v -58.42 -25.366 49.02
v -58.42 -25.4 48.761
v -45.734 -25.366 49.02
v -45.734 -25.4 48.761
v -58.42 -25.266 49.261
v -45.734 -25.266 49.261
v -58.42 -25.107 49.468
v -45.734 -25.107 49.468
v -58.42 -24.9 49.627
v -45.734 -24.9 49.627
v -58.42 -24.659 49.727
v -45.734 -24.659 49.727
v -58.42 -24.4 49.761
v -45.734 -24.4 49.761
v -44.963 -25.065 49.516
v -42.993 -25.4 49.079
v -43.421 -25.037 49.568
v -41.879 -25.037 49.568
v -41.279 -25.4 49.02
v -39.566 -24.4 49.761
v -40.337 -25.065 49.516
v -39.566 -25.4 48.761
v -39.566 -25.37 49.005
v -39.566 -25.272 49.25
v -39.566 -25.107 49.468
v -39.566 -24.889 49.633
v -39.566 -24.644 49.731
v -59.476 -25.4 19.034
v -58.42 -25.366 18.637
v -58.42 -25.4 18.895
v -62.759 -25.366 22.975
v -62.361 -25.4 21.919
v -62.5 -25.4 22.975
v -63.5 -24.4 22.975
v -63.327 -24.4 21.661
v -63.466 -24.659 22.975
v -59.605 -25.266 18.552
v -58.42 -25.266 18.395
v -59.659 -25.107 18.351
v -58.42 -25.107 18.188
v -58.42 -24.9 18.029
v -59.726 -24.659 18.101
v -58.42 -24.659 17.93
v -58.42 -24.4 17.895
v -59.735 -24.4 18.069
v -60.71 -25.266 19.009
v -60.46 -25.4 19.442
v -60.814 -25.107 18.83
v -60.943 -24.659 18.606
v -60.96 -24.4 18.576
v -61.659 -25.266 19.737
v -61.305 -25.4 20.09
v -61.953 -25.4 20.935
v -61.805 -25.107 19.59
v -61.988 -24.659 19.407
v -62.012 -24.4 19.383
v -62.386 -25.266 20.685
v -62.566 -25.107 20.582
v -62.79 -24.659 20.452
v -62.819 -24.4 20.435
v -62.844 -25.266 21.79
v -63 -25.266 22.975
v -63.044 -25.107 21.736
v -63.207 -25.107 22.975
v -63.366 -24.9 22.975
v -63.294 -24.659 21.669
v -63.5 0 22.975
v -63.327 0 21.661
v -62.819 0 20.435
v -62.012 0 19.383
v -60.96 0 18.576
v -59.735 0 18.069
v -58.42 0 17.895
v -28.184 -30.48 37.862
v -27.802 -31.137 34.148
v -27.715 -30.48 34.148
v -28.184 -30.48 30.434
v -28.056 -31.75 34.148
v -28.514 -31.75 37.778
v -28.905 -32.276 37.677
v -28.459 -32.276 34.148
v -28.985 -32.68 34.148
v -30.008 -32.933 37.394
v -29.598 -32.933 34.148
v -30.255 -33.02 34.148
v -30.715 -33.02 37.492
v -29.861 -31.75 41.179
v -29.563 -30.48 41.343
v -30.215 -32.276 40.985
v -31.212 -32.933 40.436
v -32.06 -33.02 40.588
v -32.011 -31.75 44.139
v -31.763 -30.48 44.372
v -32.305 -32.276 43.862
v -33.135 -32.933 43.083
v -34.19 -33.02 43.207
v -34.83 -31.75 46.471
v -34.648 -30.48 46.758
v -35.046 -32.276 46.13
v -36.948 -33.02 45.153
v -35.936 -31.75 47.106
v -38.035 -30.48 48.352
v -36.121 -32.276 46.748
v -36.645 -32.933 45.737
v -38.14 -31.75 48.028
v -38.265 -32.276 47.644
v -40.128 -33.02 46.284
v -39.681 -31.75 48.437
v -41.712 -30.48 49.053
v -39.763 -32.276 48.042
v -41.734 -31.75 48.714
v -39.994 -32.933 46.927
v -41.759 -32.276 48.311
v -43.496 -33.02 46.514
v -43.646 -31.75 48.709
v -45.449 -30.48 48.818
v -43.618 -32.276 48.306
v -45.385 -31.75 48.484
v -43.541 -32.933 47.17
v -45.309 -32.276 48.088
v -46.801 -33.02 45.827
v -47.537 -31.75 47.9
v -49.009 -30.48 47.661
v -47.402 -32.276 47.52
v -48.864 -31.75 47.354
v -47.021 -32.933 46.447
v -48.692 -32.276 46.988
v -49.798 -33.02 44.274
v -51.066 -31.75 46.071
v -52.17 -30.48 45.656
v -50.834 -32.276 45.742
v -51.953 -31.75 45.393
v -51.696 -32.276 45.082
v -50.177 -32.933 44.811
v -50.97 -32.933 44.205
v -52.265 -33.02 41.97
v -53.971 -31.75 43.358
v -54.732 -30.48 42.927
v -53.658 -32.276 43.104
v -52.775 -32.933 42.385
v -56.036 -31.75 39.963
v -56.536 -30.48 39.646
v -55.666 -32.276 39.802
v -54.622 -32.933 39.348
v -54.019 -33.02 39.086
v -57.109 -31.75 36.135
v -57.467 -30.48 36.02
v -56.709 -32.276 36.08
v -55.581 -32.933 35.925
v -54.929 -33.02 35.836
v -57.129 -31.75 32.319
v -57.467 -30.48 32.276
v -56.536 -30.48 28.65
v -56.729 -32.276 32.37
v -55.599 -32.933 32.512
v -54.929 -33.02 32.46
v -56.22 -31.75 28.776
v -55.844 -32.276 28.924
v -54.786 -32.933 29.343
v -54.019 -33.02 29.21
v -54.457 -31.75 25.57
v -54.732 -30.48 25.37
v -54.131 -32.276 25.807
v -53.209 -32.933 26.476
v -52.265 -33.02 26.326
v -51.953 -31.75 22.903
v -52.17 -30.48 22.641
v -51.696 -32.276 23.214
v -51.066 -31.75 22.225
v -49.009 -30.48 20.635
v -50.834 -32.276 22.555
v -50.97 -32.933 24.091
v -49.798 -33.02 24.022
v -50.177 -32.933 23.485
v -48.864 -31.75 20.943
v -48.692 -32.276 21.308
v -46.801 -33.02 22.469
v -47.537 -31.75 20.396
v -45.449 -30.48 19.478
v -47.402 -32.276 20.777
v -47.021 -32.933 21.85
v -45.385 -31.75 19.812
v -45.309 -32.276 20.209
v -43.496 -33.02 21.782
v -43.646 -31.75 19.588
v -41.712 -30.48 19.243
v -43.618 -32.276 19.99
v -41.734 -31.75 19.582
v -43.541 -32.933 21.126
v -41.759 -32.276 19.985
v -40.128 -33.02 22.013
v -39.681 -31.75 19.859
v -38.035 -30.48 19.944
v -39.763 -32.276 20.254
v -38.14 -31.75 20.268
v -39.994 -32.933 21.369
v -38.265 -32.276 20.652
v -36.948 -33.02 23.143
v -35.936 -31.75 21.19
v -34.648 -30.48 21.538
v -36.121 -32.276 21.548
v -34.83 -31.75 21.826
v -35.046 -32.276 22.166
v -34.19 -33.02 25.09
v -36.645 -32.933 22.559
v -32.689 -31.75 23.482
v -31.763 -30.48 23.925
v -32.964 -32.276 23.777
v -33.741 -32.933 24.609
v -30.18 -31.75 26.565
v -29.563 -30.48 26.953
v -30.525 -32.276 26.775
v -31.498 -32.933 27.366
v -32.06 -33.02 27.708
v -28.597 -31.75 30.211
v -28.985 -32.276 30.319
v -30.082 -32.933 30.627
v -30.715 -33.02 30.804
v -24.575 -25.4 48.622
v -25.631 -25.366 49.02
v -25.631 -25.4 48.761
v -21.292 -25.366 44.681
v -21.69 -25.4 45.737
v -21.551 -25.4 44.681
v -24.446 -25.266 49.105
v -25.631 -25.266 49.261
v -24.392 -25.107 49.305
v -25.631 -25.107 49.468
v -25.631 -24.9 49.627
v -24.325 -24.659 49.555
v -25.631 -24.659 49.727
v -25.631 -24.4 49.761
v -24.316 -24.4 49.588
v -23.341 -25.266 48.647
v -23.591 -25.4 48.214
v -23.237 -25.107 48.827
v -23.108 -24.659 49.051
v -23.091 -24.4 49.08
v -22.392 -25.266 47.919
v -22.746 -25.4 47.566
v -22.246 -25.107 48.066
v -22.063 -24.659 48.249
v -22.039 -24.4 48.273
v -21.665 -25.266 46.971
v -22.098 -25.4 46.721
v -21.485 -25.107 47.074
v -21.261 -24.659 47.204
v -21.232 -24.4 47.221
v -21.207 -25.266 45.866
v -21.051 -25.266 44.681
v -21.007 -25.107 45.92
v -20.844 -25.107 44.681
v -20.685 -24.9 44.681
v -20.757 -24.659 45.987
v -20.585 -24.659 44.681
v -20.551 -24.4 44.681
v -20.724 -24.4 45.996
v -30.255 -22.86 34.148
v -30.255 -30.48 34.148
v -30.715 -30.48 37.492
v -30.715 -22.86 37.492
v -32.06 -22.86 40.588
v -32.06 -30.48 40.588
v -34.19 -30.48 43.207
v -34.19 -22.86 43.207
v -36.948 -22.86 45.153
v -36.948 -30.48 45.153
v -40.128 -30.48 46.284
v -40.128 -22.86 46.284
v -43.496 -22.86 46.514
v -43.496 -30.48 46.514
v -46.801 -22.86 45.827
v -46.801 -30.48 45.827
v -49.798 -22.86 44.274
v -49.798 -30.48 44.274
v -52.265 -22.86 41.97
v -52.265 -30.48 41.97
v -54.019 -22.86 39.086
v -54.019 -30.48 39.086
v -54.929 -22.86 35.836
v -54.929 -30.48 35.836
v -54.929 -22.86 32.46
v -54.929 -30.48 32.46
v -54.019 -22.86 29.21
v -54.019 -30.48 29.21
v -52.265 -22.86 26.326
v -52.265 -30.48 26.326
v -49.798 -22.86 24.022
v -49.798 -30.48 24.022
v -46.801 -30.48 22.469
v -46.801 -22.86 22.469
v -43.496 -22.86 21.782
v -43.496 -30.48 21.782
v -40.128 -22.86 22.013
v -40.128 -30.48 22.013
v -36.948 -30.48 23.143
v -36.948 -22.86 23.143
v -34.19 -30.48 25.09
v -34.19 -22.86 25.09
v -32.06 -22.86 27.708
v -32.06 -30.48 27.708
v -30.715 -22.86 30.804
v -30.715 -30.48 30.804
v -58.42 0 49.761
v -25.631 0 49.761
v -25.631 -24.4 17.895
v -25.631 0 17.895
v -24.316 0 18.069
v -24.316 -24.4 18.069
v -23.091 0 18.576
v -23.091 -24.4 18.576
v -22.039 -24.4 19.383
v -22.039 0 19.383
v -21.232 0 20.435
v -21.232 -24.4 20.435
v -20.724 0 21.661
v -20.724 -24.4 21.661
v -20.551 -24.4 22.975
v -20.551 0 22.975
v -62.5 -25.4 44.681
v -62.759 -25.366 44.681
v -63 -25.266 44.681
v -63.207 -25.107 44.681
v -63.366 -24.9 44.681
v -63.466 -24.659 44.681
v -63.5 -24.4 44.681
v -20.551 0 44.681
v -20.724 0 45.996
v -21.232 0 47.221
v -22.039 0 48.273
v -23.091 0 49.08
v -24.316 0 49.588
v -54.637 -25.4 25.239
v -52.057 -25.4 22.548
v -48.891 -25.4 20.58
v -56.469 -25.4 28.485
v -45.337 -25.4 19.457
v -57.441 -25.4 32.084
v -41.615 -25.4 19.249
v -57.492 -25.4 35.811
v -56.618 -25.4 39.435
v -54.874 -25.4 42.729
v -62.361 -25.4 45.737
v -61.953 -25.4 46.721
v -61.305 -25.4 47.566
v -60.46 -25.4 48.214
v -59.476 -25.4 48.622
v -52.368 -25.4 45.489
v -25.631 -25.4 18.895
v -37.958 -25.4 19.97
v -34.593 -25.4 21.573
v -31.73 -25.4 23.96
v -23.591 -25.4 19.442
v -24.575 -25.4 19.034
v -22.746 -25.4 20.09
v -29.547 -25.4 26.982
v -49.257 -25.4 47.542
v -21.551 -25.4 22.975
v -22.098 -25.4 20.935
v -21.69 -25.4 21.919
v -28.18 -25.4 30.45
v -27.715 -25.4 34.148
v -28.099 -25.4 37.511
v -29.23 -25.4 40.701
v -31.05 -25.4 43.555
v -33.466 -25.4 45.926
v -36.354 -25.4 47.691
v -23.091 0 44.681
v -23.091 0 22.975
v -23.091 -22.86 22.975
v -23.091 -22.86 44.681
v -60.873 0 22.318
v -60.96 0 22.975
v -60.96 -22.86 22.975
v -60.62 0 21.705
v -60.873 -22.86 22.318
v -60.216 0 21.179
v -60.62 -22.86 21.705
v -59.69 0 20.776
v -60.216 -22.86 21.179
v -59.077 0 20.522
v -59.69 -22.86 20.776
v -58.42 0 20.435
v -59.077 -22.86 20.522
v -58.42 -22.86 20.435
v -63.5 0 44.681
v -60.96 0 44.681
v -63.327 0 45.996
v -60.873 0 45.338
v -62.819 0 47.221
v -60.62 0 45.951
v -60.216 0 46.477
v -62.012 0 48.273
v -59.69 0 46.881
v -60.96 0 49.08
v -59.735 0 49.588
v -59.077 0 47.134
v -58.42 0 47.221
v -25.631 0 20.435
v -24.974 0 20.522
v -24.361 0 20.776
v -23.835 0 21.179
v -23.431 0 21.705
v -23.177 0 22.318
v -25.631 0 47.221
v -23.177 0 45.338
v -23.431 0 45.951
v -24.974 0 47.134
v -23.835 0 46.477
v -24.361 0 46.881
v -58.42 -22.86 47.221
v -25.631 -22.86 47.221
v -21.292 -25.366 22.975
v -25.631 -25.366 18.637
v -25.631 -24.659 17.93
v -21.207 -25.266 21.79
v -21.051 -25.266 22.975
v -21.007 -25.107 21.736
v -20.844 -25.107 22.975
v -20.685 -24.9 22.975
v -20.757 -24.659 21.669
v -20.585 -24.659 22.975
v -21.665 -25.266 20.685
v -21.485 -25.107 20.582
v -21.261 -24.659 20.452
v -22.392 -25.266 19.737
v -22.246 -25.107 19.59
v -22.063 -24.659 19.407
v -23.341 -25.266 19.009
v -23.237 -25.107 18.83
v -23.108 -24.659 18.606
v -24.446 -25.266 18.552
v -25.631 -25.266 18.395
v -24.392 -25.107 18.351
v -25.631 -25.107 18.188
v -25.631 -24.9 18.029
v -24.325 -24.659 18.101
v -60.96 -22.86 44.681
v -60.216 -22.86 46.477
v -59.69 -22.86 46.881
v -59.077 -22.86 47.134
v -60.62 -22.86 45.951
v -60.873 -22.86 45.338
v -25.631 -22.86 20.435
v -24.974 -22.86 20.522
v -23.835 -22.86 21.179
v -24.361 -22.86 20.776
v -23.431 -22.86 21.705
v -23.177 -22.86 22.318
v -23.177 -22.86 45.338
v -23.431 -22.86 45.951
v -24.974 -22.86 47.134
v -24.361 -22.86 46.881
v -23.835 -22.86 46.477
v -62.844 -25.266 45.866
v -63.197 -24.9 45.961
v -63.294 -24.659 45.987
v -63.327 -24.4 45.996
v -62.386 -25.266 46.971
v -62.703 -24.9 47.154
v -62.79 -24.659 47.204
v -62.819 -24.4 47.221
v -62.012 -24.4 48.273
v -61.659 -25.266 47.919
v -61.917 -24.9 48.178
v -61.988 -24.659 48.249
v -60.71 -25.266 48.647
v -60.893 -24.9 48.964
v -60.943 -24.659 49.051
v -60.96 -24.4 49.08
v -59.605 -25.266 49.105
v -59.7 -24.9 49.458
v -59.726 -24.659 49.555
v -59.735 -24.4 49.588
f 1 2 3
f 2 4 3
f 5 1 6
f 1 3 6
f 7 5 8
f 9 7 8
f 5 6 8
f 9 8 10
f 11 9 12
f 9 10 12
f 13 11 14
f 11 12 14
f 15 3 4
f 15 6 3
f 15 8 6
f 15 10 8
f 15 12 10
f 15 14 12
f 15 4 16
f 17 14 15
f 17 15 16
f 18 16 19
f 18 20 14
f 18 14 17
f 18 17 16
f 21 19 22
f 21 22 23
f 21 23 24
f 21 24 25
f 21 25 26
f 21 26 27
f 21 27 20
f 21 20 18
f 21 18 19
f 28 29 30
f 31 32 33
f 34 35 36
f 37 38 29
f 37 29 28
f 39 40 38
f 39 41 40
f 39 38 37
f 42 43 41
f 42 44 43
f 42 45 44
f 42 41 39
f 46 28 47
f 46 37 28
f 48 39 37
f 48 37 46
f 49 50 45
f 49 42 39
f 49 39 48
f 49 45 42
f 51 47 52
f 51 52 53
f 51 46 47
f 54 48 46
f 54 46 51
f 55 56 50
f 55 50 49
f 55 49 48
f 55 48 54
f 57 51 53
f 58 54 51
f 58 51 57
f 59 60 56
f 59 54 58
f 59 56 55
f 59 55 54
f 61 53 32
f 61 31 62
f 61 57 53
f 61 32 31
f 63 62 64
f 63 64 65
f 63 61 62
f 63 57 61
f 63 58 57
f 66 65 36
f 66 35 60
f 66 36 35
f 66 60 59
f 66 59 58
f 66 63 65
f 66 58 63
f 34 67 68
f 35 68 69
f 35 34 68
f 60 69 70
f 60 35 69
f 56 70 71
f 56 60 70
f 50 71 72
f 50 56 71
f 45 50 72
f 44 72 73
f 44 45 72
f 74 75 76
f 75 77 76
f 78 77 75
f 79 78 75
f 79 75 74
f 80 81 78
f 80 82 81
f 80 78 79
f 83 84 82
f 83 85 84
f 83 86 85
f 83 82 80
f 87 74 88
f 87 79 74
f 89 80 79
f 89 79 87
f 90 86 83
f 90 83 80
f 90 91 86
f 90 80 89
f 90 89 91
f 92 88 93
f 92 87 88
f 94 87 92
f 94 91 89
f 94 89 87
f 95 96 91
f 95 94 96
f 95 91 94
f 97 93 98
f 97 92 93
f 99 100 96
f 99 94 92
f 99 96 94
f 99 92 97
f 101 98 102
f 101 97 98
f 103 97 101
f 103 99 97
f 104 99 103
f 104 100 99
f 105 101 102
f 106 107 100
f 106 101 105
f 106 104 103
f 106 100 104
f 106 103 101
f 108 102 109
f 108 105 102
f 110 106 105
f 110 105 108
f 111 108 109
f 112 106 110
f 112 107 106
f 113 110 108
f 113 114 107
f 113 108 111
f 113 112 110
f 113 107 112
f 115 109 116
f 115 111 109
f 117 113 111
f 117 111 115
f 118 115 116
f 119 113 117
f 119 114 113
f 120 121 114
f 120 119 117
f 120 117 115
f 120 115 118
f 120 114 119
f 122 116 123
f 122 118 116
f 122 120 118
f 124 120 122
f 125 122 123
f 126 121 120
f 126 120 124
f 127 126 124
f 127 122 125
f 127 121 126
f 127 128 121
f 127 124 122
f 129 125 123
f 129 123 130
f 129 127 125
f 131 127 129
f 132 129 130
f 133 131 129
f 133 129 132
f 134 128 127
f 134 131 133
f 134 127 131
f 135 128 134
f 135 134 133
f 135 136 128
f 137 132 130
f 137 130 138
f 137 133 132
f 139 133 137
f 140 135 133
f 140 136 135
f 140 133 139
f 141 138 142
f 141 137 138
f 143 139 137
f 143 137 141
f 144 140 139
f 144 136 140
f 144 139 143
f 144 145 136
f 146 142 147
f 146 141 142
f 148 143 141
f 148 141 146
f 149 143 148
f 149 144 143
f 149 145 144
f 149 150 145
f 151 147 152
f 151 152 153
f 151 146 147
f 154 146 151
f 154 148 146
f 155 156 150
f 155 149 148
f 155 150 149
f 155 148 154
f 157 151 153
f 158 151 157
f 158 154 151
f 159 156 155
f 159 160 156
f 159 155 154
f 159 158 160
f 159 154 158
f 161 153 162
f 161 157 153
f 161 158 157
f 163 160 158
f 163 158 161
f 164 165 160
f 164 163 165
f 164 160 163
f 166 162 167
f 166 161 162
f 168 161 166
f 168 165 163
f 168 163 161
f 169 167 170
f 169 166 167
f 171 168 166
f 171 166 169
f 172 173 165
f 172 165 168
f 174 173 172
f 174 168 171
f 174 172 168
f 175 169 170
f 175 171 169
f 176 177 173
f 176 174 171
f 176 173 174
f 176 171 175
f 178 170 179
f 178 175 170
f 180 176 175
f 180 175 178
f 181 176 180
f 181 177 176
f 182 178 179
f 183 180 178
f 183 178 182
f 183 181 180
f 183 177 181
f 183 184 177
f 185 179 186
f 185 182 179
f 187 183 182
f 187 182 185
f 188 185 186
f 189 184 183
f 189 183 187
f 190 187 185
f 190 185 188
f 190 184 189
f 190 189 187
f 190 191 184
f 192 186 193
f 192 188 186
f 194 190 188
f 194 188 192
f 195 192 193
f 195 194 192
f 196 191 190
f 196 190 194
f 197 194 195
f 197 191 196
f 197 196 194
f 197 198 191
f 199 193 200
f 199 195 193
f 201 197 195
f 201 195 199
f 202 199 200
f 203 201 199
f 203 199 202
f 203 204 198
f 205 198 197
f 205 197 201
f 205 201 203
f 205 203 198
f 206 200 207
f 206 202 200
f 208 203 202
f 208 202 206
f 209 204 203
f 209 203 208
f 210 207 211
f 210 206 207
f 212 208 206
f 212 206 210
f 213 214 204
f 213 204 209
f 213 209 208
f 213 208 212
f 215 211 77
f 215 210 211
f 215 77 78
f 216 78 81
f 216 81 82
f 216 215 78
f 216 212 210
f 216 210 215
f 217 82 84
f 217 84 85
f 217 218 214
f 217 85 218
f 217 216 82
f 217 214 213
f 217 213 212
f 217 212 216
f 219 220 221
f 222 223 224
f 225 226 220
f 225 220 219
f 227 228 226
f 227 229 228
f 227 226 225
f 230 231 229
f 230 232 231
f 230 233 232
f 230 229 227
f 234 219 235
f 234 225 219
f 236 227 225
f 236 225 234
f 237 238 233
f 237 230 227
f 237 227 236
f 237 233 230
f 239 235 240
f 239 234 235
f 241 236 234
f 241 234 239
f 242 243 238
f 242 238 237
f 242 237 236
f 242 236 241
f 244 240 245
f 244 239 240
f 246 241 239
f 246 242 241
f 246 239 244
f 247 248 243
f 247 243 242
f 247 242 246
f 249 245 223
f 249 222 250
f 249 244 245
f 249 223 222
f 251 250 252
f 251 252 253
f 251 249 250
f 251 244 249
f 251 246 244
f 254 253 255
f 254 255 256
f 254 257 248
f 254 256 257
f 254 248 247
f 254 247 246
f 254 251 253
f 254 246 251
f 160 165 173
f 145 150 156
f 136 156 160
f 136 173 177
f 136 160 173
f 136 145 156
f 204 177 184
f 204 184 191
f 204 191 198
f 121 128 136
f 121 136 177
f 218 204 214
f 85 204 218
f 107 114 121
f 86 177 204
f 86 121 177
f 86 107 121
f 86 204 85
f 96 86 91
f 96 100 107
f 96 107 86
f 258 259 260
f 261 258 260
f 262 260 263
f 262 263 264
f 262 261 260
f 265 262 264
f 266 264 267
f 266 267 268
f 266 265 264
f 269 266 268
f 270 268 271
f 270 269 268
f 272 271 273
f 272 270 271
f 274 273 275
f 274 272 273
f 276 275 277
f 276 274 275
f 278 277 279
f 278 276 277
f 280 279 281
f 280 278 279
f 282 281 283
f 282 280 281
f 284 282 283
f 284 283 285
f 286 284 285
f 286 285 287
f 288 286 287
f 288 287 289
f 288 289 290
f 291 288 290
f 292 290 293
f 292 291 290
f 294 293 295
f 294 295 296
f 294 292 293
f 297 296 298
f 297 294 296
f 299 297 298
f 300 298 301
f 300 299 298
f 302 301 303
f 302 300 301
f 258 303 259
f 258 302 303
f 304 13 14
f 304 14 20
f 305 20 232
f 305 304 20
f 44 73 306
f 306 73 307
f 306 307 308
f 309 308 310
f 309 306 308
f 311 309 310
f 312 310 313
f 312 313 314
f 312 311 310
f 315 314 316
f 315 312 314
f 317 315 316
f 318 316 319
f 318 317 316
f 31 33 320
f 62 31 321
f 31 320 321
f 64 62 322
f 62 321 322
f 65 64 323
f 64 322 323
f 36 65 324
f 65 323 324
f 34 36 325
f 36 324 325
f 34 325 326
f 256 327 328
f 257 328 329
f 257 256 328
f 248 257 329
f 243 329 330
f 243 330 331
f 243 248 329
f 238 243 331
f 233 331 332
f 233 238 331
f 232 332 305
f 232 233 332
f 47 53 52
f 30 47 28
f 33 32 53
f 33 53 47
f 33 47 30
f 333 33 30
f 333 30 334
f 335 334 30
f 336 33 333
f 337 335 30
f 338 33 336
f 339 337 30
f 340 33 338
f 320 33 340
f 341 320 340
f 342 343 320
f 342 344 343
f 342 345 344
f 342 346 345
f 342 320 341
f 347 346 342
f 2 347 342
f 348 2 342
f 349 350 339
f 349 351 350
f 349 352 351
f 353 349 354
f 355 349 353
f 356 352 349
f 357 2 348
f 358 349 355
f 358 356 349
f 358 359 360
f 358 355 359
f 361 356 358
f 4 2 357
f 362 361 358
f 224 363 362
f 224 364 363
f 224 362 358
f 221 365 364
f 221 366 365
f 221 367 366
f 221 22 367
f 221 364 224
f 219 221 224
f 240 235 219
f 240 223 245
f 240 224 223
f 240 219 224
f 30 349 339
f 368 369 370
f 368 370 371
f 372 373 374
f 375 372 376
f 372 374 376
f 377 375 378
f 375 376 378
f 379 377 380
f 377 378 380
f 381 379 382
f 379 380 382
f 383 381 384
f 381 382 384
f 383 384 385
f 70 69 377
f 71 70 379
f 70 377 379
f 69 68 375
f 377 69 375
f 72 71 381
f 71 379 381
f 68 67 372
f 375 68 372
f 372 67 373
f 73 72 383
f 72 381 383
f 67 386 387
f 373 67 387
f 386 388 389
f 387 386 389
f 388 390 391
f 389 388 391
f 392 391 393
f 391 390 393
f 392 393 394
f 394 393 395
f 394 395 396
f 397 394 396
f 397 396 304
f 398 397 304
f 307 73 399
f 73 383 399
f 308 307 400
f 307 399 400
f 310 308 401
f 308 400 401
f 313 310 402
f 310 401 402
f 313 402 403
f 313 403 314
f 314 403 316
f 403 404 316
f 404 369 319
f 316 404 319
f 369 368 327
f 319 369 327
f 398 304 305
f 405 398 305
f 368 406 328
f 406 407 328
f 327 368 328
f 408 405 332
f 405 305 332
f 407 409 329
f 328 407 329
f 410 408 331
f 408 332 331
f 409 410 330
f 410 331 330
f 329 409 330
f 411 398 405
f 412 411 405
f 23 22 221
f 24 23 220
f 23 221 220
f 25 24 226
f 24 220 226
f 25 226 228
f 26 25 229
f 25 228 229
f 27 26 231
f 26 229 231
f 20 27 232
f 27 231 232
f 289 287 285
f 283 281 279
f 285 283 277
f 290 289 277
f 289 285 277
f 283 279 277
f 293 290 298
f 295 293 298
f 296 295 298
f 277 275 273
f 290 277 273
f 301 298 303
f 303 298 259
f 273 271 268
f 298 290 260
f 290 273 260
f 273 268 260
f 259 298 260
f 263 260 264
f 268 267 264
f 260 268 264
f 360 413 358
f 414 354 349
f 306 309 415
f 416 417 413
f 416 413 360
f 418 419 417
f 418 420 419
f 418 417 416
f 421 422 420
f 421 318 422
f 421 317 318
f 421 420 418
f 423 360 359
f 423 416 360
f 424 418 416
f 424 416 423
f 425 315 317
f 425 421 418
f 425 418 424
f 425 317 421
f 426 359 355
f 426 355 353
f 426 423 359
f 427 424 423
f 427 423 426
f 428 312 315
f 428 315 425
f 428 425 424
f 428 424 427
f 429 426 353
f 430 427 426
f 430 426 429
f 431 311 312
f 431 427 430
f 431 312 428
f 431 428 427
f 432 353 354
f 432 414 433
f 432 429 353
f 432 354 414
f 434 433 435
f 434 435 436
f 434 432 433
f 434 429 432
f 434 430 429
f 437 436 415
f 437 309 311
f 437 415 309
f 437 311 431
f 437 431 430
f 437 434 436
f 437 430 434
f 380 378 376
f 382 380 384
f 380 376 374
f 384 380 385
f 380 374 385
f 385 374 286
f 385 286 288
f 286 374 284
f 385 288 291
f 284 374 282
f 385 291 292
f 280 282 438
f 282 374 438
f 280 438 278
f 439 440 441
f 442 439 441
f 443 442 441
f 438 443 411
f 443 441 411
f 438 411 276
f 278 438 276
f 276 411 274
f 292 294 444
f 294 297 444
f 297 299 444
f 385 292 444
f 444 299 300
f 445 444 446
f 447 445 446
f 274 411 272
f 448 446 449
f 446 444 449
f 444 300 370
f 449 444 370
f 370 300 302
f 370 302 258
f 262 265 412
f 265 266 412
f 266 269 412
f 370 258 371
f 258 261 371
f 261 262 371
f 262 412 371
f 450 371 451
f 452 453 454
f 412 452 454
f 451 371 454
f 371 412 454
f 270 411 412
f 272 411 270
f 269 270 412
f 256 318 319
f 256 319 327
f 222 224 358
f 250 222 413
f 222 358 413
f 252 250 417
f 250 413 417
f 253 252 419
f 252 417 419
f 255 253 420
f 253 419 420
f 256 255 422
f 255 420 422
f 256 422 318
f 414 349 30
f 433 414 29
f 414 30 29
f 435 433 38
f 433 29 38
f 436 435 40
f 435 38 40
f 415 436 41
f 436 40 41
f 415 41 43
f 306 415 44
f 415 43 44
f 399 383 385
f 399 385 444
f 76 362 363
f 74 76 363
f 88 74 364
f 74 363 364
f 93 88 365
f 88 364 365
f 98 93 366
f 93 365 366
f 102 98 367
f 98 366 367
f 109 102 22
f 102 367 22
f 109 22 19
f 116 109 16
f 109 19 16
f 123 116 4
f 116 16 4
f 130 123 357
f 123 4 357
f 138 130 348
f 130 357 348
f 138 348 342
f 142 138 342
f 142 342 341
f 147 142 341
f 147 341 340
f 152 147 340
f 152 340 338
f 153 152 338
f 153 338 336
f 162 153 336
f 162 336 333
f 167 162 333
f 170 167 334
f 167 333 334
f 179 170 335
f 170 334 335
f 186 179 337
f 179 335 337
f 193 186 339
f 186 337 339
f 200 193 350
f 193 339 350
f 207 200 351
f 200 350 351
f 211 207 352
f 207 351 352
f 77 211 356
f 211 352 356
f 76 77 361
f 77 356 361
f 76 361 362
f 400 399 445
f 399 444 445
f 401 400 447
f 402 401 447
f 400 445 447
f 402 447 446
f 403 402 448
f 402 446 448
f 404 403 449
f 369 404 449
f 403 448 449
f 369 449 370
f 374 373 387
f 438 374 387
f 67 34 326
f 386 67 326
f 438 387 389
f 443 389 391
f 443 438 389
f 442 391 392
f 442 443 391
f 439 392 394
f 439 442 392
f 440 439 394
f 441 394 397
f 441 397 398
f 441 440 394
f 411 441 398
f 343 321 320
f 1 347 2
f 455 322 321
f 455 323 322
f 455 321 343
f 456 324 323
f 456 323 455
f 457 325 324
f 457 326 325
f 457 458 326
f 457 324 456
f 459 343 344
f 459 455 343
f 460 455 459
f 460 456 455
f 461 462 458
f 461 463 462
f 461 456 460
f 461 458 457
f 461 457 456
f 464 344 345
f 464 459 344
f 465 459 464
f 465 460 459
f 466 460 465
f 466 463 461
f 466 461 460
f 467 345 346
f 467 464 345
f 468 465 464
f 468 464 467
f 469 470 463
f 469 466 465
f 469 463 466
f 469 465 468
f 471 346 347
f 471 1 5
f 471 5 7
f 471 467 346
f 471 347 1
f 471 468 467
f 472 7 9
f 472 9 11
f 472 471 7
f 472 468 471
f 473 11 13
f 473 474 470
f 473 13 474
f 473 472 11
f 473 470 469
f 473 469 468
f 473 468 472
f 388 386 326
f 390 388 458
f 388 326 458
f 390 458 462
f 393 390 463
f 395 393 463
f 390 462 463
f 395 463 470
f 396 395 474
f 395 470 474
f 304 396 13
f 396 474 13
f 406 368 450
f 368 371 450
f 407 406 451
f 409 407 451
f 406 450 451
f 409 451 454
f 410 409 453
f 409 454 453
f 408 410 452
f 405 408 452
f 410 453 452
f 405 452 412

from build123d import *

# Parameters (mm, degrees)
F0_W     = 42.9490916431
F0_H     = 31.8654570729
F1_DEPTH = 25.4
F2_R     = 5.08
F3_T     = -2.54
F4_R     = 14.9347335013
F5_DEPTH = 7.62
F6_R     = 2.54
F7_T     = 2.54
F8_R     = 1


# Not quite as in the source:
# - a shell that OpenCascade refuses in one call is made with other operations: the cavity is built on its own and cut out


with BuildPart() as f1:
    # F0 (on Front) → F1 (new body)
    with BuildSketch(Plane.XZ):
        with Locations((-42.025456205, 33.8281830773)):
            Rectangle(F0_W, F0_H)
    extrude(amount=F1_DEPTH)

    # F2
    f2_edges = [f1.edges().sort_by_distance(p)[0] for p in [
        (-63.500002, -12.7, 49.760912),
        (-20.55091, -12.7, 49.760912),
        (-20.55091, -12.7, 17.895455),
        (-63.500002, -12.7, 17.895455),
    ]]
    fillet(f2_edges, radius=F2_R)

    # F3
    f3_openings = [f1.faces().sort_by_distance(p)[0] for p in [
        (-42.025456, 0, 33.828183),
    ]]
    offset(amount=F3_T, openings=f3_openings)

    # F4 (on face) → F5 (join)
    with BuildSketch(Plane.XZ.offset(25.4)):
        with Locations((-42.6500104368, 34.1481156647)):
            Circle(F4_R)
    extrude(amount=F5_DEPTH)

    # F6
    f6_edges = [f1.edges().sort_by_distance(p)[0] for p in [
        (-57.584744, -33.02, 34.148116),
    ]]
    fillet(f6_edges, radius=F6_R)

    # F7: shell of thickness 2.54, made by hand


with BuildPart() as f7_core1:
    # F7_t2: copy of F1
    add(f1.part)

    # the walls: a layer under each face that stays
    f7_faces = [f7_core1.faces().sort_by_distance(p)[0] for p in [
        (-57.5847439381, -27.94, 34.1481156647),
        (-56.341820086, -25.4, 23.206364053),
        (-42.6500104368, -33.02, 34.1481156647),
        (-42.025456205, -12.7, 49.7609116137),
        (-22.038807935, -12.7, 48.2730140621),
        (-62.012104475, -12.7, 48.2730140621),
        (-20.5509103835, -12.7, 33.8281830773),
        (-63.5000020266, -12.7, 33.8281830773),
        (-22.038807935, -12.7, 19.3833520924),
        (-62.012104475, -12.7, 19.3833520924),
        (-42.025456205, -12.7, 17.8954545408),
        (-60.4322097663, 0, 20.1715586175),
        (-42.025456205, -11.43, 47.2209116137),
        (-23.8348591592, -11.43, 46.4769628379),
        (-23.0909103835, -11.43, 33.8281830773),
        (-23.8348591592, -11.43, 21.1794033166),
        (-42.025456205, -11.43, 20.4354545408),
        (-60.2160532508, -11.43, 21.1794033166),
        (-60.9600020266, -11.43, 33.8281830773),
        (-60.2160532508, -11.43, 46.4769628379),
    ]]
    thicken(f7_faces, amount=-F7_T, mode=Mode.SUBTRACT)

    # F7_s3 → F7_t4 (revolve, cut)
    with BuildSketch(Plane.XY.offset(34.1481156647)):
        Polygon((-27.6898769355, -25.4254), (-30.2552769355, -25.4), (-30.2552769355, -22.86), (-27.7152769355, -22.86), align=None)
    revolve(axis=Axis((-42.6500104368, -25.4, 34.1481156647), (0, -1, 0)), mode=Mode.SUBTRACT)


with BuildPart() as f1_1:
    add(f1.part)

    # what is left inside the walls is the cavity
    f7_cavity = [f7_core1.part.solids().sort_by_distance(p)[0] for p in [
        (-55.019344, -27.94, 34.148116),
    ]]
    add(f7_cavity, mode=Mode.SUBTRACT)

    # F8
    f8_edges = [f1_1.edges().sort_by_distance(p)[0] for p in [
        (-42.025456, -25.4, 49.760912),
        (-22.038808, -25.4, 48.273014),
        (-62.012104, -25.4, 48.273014),
        (-20.55091, -25.4, 33.828183),
        (-63.500002, -25.4, 33.828183),
        (-22.038808, -25.4, 19.383352),
        (-62.012104, -25.4, 19.383352),
        (-42.025456, -25.4, 17.895455),
    ]]
    fillet(f8_edges, radius=F8_R)


solid = f1_1.part
